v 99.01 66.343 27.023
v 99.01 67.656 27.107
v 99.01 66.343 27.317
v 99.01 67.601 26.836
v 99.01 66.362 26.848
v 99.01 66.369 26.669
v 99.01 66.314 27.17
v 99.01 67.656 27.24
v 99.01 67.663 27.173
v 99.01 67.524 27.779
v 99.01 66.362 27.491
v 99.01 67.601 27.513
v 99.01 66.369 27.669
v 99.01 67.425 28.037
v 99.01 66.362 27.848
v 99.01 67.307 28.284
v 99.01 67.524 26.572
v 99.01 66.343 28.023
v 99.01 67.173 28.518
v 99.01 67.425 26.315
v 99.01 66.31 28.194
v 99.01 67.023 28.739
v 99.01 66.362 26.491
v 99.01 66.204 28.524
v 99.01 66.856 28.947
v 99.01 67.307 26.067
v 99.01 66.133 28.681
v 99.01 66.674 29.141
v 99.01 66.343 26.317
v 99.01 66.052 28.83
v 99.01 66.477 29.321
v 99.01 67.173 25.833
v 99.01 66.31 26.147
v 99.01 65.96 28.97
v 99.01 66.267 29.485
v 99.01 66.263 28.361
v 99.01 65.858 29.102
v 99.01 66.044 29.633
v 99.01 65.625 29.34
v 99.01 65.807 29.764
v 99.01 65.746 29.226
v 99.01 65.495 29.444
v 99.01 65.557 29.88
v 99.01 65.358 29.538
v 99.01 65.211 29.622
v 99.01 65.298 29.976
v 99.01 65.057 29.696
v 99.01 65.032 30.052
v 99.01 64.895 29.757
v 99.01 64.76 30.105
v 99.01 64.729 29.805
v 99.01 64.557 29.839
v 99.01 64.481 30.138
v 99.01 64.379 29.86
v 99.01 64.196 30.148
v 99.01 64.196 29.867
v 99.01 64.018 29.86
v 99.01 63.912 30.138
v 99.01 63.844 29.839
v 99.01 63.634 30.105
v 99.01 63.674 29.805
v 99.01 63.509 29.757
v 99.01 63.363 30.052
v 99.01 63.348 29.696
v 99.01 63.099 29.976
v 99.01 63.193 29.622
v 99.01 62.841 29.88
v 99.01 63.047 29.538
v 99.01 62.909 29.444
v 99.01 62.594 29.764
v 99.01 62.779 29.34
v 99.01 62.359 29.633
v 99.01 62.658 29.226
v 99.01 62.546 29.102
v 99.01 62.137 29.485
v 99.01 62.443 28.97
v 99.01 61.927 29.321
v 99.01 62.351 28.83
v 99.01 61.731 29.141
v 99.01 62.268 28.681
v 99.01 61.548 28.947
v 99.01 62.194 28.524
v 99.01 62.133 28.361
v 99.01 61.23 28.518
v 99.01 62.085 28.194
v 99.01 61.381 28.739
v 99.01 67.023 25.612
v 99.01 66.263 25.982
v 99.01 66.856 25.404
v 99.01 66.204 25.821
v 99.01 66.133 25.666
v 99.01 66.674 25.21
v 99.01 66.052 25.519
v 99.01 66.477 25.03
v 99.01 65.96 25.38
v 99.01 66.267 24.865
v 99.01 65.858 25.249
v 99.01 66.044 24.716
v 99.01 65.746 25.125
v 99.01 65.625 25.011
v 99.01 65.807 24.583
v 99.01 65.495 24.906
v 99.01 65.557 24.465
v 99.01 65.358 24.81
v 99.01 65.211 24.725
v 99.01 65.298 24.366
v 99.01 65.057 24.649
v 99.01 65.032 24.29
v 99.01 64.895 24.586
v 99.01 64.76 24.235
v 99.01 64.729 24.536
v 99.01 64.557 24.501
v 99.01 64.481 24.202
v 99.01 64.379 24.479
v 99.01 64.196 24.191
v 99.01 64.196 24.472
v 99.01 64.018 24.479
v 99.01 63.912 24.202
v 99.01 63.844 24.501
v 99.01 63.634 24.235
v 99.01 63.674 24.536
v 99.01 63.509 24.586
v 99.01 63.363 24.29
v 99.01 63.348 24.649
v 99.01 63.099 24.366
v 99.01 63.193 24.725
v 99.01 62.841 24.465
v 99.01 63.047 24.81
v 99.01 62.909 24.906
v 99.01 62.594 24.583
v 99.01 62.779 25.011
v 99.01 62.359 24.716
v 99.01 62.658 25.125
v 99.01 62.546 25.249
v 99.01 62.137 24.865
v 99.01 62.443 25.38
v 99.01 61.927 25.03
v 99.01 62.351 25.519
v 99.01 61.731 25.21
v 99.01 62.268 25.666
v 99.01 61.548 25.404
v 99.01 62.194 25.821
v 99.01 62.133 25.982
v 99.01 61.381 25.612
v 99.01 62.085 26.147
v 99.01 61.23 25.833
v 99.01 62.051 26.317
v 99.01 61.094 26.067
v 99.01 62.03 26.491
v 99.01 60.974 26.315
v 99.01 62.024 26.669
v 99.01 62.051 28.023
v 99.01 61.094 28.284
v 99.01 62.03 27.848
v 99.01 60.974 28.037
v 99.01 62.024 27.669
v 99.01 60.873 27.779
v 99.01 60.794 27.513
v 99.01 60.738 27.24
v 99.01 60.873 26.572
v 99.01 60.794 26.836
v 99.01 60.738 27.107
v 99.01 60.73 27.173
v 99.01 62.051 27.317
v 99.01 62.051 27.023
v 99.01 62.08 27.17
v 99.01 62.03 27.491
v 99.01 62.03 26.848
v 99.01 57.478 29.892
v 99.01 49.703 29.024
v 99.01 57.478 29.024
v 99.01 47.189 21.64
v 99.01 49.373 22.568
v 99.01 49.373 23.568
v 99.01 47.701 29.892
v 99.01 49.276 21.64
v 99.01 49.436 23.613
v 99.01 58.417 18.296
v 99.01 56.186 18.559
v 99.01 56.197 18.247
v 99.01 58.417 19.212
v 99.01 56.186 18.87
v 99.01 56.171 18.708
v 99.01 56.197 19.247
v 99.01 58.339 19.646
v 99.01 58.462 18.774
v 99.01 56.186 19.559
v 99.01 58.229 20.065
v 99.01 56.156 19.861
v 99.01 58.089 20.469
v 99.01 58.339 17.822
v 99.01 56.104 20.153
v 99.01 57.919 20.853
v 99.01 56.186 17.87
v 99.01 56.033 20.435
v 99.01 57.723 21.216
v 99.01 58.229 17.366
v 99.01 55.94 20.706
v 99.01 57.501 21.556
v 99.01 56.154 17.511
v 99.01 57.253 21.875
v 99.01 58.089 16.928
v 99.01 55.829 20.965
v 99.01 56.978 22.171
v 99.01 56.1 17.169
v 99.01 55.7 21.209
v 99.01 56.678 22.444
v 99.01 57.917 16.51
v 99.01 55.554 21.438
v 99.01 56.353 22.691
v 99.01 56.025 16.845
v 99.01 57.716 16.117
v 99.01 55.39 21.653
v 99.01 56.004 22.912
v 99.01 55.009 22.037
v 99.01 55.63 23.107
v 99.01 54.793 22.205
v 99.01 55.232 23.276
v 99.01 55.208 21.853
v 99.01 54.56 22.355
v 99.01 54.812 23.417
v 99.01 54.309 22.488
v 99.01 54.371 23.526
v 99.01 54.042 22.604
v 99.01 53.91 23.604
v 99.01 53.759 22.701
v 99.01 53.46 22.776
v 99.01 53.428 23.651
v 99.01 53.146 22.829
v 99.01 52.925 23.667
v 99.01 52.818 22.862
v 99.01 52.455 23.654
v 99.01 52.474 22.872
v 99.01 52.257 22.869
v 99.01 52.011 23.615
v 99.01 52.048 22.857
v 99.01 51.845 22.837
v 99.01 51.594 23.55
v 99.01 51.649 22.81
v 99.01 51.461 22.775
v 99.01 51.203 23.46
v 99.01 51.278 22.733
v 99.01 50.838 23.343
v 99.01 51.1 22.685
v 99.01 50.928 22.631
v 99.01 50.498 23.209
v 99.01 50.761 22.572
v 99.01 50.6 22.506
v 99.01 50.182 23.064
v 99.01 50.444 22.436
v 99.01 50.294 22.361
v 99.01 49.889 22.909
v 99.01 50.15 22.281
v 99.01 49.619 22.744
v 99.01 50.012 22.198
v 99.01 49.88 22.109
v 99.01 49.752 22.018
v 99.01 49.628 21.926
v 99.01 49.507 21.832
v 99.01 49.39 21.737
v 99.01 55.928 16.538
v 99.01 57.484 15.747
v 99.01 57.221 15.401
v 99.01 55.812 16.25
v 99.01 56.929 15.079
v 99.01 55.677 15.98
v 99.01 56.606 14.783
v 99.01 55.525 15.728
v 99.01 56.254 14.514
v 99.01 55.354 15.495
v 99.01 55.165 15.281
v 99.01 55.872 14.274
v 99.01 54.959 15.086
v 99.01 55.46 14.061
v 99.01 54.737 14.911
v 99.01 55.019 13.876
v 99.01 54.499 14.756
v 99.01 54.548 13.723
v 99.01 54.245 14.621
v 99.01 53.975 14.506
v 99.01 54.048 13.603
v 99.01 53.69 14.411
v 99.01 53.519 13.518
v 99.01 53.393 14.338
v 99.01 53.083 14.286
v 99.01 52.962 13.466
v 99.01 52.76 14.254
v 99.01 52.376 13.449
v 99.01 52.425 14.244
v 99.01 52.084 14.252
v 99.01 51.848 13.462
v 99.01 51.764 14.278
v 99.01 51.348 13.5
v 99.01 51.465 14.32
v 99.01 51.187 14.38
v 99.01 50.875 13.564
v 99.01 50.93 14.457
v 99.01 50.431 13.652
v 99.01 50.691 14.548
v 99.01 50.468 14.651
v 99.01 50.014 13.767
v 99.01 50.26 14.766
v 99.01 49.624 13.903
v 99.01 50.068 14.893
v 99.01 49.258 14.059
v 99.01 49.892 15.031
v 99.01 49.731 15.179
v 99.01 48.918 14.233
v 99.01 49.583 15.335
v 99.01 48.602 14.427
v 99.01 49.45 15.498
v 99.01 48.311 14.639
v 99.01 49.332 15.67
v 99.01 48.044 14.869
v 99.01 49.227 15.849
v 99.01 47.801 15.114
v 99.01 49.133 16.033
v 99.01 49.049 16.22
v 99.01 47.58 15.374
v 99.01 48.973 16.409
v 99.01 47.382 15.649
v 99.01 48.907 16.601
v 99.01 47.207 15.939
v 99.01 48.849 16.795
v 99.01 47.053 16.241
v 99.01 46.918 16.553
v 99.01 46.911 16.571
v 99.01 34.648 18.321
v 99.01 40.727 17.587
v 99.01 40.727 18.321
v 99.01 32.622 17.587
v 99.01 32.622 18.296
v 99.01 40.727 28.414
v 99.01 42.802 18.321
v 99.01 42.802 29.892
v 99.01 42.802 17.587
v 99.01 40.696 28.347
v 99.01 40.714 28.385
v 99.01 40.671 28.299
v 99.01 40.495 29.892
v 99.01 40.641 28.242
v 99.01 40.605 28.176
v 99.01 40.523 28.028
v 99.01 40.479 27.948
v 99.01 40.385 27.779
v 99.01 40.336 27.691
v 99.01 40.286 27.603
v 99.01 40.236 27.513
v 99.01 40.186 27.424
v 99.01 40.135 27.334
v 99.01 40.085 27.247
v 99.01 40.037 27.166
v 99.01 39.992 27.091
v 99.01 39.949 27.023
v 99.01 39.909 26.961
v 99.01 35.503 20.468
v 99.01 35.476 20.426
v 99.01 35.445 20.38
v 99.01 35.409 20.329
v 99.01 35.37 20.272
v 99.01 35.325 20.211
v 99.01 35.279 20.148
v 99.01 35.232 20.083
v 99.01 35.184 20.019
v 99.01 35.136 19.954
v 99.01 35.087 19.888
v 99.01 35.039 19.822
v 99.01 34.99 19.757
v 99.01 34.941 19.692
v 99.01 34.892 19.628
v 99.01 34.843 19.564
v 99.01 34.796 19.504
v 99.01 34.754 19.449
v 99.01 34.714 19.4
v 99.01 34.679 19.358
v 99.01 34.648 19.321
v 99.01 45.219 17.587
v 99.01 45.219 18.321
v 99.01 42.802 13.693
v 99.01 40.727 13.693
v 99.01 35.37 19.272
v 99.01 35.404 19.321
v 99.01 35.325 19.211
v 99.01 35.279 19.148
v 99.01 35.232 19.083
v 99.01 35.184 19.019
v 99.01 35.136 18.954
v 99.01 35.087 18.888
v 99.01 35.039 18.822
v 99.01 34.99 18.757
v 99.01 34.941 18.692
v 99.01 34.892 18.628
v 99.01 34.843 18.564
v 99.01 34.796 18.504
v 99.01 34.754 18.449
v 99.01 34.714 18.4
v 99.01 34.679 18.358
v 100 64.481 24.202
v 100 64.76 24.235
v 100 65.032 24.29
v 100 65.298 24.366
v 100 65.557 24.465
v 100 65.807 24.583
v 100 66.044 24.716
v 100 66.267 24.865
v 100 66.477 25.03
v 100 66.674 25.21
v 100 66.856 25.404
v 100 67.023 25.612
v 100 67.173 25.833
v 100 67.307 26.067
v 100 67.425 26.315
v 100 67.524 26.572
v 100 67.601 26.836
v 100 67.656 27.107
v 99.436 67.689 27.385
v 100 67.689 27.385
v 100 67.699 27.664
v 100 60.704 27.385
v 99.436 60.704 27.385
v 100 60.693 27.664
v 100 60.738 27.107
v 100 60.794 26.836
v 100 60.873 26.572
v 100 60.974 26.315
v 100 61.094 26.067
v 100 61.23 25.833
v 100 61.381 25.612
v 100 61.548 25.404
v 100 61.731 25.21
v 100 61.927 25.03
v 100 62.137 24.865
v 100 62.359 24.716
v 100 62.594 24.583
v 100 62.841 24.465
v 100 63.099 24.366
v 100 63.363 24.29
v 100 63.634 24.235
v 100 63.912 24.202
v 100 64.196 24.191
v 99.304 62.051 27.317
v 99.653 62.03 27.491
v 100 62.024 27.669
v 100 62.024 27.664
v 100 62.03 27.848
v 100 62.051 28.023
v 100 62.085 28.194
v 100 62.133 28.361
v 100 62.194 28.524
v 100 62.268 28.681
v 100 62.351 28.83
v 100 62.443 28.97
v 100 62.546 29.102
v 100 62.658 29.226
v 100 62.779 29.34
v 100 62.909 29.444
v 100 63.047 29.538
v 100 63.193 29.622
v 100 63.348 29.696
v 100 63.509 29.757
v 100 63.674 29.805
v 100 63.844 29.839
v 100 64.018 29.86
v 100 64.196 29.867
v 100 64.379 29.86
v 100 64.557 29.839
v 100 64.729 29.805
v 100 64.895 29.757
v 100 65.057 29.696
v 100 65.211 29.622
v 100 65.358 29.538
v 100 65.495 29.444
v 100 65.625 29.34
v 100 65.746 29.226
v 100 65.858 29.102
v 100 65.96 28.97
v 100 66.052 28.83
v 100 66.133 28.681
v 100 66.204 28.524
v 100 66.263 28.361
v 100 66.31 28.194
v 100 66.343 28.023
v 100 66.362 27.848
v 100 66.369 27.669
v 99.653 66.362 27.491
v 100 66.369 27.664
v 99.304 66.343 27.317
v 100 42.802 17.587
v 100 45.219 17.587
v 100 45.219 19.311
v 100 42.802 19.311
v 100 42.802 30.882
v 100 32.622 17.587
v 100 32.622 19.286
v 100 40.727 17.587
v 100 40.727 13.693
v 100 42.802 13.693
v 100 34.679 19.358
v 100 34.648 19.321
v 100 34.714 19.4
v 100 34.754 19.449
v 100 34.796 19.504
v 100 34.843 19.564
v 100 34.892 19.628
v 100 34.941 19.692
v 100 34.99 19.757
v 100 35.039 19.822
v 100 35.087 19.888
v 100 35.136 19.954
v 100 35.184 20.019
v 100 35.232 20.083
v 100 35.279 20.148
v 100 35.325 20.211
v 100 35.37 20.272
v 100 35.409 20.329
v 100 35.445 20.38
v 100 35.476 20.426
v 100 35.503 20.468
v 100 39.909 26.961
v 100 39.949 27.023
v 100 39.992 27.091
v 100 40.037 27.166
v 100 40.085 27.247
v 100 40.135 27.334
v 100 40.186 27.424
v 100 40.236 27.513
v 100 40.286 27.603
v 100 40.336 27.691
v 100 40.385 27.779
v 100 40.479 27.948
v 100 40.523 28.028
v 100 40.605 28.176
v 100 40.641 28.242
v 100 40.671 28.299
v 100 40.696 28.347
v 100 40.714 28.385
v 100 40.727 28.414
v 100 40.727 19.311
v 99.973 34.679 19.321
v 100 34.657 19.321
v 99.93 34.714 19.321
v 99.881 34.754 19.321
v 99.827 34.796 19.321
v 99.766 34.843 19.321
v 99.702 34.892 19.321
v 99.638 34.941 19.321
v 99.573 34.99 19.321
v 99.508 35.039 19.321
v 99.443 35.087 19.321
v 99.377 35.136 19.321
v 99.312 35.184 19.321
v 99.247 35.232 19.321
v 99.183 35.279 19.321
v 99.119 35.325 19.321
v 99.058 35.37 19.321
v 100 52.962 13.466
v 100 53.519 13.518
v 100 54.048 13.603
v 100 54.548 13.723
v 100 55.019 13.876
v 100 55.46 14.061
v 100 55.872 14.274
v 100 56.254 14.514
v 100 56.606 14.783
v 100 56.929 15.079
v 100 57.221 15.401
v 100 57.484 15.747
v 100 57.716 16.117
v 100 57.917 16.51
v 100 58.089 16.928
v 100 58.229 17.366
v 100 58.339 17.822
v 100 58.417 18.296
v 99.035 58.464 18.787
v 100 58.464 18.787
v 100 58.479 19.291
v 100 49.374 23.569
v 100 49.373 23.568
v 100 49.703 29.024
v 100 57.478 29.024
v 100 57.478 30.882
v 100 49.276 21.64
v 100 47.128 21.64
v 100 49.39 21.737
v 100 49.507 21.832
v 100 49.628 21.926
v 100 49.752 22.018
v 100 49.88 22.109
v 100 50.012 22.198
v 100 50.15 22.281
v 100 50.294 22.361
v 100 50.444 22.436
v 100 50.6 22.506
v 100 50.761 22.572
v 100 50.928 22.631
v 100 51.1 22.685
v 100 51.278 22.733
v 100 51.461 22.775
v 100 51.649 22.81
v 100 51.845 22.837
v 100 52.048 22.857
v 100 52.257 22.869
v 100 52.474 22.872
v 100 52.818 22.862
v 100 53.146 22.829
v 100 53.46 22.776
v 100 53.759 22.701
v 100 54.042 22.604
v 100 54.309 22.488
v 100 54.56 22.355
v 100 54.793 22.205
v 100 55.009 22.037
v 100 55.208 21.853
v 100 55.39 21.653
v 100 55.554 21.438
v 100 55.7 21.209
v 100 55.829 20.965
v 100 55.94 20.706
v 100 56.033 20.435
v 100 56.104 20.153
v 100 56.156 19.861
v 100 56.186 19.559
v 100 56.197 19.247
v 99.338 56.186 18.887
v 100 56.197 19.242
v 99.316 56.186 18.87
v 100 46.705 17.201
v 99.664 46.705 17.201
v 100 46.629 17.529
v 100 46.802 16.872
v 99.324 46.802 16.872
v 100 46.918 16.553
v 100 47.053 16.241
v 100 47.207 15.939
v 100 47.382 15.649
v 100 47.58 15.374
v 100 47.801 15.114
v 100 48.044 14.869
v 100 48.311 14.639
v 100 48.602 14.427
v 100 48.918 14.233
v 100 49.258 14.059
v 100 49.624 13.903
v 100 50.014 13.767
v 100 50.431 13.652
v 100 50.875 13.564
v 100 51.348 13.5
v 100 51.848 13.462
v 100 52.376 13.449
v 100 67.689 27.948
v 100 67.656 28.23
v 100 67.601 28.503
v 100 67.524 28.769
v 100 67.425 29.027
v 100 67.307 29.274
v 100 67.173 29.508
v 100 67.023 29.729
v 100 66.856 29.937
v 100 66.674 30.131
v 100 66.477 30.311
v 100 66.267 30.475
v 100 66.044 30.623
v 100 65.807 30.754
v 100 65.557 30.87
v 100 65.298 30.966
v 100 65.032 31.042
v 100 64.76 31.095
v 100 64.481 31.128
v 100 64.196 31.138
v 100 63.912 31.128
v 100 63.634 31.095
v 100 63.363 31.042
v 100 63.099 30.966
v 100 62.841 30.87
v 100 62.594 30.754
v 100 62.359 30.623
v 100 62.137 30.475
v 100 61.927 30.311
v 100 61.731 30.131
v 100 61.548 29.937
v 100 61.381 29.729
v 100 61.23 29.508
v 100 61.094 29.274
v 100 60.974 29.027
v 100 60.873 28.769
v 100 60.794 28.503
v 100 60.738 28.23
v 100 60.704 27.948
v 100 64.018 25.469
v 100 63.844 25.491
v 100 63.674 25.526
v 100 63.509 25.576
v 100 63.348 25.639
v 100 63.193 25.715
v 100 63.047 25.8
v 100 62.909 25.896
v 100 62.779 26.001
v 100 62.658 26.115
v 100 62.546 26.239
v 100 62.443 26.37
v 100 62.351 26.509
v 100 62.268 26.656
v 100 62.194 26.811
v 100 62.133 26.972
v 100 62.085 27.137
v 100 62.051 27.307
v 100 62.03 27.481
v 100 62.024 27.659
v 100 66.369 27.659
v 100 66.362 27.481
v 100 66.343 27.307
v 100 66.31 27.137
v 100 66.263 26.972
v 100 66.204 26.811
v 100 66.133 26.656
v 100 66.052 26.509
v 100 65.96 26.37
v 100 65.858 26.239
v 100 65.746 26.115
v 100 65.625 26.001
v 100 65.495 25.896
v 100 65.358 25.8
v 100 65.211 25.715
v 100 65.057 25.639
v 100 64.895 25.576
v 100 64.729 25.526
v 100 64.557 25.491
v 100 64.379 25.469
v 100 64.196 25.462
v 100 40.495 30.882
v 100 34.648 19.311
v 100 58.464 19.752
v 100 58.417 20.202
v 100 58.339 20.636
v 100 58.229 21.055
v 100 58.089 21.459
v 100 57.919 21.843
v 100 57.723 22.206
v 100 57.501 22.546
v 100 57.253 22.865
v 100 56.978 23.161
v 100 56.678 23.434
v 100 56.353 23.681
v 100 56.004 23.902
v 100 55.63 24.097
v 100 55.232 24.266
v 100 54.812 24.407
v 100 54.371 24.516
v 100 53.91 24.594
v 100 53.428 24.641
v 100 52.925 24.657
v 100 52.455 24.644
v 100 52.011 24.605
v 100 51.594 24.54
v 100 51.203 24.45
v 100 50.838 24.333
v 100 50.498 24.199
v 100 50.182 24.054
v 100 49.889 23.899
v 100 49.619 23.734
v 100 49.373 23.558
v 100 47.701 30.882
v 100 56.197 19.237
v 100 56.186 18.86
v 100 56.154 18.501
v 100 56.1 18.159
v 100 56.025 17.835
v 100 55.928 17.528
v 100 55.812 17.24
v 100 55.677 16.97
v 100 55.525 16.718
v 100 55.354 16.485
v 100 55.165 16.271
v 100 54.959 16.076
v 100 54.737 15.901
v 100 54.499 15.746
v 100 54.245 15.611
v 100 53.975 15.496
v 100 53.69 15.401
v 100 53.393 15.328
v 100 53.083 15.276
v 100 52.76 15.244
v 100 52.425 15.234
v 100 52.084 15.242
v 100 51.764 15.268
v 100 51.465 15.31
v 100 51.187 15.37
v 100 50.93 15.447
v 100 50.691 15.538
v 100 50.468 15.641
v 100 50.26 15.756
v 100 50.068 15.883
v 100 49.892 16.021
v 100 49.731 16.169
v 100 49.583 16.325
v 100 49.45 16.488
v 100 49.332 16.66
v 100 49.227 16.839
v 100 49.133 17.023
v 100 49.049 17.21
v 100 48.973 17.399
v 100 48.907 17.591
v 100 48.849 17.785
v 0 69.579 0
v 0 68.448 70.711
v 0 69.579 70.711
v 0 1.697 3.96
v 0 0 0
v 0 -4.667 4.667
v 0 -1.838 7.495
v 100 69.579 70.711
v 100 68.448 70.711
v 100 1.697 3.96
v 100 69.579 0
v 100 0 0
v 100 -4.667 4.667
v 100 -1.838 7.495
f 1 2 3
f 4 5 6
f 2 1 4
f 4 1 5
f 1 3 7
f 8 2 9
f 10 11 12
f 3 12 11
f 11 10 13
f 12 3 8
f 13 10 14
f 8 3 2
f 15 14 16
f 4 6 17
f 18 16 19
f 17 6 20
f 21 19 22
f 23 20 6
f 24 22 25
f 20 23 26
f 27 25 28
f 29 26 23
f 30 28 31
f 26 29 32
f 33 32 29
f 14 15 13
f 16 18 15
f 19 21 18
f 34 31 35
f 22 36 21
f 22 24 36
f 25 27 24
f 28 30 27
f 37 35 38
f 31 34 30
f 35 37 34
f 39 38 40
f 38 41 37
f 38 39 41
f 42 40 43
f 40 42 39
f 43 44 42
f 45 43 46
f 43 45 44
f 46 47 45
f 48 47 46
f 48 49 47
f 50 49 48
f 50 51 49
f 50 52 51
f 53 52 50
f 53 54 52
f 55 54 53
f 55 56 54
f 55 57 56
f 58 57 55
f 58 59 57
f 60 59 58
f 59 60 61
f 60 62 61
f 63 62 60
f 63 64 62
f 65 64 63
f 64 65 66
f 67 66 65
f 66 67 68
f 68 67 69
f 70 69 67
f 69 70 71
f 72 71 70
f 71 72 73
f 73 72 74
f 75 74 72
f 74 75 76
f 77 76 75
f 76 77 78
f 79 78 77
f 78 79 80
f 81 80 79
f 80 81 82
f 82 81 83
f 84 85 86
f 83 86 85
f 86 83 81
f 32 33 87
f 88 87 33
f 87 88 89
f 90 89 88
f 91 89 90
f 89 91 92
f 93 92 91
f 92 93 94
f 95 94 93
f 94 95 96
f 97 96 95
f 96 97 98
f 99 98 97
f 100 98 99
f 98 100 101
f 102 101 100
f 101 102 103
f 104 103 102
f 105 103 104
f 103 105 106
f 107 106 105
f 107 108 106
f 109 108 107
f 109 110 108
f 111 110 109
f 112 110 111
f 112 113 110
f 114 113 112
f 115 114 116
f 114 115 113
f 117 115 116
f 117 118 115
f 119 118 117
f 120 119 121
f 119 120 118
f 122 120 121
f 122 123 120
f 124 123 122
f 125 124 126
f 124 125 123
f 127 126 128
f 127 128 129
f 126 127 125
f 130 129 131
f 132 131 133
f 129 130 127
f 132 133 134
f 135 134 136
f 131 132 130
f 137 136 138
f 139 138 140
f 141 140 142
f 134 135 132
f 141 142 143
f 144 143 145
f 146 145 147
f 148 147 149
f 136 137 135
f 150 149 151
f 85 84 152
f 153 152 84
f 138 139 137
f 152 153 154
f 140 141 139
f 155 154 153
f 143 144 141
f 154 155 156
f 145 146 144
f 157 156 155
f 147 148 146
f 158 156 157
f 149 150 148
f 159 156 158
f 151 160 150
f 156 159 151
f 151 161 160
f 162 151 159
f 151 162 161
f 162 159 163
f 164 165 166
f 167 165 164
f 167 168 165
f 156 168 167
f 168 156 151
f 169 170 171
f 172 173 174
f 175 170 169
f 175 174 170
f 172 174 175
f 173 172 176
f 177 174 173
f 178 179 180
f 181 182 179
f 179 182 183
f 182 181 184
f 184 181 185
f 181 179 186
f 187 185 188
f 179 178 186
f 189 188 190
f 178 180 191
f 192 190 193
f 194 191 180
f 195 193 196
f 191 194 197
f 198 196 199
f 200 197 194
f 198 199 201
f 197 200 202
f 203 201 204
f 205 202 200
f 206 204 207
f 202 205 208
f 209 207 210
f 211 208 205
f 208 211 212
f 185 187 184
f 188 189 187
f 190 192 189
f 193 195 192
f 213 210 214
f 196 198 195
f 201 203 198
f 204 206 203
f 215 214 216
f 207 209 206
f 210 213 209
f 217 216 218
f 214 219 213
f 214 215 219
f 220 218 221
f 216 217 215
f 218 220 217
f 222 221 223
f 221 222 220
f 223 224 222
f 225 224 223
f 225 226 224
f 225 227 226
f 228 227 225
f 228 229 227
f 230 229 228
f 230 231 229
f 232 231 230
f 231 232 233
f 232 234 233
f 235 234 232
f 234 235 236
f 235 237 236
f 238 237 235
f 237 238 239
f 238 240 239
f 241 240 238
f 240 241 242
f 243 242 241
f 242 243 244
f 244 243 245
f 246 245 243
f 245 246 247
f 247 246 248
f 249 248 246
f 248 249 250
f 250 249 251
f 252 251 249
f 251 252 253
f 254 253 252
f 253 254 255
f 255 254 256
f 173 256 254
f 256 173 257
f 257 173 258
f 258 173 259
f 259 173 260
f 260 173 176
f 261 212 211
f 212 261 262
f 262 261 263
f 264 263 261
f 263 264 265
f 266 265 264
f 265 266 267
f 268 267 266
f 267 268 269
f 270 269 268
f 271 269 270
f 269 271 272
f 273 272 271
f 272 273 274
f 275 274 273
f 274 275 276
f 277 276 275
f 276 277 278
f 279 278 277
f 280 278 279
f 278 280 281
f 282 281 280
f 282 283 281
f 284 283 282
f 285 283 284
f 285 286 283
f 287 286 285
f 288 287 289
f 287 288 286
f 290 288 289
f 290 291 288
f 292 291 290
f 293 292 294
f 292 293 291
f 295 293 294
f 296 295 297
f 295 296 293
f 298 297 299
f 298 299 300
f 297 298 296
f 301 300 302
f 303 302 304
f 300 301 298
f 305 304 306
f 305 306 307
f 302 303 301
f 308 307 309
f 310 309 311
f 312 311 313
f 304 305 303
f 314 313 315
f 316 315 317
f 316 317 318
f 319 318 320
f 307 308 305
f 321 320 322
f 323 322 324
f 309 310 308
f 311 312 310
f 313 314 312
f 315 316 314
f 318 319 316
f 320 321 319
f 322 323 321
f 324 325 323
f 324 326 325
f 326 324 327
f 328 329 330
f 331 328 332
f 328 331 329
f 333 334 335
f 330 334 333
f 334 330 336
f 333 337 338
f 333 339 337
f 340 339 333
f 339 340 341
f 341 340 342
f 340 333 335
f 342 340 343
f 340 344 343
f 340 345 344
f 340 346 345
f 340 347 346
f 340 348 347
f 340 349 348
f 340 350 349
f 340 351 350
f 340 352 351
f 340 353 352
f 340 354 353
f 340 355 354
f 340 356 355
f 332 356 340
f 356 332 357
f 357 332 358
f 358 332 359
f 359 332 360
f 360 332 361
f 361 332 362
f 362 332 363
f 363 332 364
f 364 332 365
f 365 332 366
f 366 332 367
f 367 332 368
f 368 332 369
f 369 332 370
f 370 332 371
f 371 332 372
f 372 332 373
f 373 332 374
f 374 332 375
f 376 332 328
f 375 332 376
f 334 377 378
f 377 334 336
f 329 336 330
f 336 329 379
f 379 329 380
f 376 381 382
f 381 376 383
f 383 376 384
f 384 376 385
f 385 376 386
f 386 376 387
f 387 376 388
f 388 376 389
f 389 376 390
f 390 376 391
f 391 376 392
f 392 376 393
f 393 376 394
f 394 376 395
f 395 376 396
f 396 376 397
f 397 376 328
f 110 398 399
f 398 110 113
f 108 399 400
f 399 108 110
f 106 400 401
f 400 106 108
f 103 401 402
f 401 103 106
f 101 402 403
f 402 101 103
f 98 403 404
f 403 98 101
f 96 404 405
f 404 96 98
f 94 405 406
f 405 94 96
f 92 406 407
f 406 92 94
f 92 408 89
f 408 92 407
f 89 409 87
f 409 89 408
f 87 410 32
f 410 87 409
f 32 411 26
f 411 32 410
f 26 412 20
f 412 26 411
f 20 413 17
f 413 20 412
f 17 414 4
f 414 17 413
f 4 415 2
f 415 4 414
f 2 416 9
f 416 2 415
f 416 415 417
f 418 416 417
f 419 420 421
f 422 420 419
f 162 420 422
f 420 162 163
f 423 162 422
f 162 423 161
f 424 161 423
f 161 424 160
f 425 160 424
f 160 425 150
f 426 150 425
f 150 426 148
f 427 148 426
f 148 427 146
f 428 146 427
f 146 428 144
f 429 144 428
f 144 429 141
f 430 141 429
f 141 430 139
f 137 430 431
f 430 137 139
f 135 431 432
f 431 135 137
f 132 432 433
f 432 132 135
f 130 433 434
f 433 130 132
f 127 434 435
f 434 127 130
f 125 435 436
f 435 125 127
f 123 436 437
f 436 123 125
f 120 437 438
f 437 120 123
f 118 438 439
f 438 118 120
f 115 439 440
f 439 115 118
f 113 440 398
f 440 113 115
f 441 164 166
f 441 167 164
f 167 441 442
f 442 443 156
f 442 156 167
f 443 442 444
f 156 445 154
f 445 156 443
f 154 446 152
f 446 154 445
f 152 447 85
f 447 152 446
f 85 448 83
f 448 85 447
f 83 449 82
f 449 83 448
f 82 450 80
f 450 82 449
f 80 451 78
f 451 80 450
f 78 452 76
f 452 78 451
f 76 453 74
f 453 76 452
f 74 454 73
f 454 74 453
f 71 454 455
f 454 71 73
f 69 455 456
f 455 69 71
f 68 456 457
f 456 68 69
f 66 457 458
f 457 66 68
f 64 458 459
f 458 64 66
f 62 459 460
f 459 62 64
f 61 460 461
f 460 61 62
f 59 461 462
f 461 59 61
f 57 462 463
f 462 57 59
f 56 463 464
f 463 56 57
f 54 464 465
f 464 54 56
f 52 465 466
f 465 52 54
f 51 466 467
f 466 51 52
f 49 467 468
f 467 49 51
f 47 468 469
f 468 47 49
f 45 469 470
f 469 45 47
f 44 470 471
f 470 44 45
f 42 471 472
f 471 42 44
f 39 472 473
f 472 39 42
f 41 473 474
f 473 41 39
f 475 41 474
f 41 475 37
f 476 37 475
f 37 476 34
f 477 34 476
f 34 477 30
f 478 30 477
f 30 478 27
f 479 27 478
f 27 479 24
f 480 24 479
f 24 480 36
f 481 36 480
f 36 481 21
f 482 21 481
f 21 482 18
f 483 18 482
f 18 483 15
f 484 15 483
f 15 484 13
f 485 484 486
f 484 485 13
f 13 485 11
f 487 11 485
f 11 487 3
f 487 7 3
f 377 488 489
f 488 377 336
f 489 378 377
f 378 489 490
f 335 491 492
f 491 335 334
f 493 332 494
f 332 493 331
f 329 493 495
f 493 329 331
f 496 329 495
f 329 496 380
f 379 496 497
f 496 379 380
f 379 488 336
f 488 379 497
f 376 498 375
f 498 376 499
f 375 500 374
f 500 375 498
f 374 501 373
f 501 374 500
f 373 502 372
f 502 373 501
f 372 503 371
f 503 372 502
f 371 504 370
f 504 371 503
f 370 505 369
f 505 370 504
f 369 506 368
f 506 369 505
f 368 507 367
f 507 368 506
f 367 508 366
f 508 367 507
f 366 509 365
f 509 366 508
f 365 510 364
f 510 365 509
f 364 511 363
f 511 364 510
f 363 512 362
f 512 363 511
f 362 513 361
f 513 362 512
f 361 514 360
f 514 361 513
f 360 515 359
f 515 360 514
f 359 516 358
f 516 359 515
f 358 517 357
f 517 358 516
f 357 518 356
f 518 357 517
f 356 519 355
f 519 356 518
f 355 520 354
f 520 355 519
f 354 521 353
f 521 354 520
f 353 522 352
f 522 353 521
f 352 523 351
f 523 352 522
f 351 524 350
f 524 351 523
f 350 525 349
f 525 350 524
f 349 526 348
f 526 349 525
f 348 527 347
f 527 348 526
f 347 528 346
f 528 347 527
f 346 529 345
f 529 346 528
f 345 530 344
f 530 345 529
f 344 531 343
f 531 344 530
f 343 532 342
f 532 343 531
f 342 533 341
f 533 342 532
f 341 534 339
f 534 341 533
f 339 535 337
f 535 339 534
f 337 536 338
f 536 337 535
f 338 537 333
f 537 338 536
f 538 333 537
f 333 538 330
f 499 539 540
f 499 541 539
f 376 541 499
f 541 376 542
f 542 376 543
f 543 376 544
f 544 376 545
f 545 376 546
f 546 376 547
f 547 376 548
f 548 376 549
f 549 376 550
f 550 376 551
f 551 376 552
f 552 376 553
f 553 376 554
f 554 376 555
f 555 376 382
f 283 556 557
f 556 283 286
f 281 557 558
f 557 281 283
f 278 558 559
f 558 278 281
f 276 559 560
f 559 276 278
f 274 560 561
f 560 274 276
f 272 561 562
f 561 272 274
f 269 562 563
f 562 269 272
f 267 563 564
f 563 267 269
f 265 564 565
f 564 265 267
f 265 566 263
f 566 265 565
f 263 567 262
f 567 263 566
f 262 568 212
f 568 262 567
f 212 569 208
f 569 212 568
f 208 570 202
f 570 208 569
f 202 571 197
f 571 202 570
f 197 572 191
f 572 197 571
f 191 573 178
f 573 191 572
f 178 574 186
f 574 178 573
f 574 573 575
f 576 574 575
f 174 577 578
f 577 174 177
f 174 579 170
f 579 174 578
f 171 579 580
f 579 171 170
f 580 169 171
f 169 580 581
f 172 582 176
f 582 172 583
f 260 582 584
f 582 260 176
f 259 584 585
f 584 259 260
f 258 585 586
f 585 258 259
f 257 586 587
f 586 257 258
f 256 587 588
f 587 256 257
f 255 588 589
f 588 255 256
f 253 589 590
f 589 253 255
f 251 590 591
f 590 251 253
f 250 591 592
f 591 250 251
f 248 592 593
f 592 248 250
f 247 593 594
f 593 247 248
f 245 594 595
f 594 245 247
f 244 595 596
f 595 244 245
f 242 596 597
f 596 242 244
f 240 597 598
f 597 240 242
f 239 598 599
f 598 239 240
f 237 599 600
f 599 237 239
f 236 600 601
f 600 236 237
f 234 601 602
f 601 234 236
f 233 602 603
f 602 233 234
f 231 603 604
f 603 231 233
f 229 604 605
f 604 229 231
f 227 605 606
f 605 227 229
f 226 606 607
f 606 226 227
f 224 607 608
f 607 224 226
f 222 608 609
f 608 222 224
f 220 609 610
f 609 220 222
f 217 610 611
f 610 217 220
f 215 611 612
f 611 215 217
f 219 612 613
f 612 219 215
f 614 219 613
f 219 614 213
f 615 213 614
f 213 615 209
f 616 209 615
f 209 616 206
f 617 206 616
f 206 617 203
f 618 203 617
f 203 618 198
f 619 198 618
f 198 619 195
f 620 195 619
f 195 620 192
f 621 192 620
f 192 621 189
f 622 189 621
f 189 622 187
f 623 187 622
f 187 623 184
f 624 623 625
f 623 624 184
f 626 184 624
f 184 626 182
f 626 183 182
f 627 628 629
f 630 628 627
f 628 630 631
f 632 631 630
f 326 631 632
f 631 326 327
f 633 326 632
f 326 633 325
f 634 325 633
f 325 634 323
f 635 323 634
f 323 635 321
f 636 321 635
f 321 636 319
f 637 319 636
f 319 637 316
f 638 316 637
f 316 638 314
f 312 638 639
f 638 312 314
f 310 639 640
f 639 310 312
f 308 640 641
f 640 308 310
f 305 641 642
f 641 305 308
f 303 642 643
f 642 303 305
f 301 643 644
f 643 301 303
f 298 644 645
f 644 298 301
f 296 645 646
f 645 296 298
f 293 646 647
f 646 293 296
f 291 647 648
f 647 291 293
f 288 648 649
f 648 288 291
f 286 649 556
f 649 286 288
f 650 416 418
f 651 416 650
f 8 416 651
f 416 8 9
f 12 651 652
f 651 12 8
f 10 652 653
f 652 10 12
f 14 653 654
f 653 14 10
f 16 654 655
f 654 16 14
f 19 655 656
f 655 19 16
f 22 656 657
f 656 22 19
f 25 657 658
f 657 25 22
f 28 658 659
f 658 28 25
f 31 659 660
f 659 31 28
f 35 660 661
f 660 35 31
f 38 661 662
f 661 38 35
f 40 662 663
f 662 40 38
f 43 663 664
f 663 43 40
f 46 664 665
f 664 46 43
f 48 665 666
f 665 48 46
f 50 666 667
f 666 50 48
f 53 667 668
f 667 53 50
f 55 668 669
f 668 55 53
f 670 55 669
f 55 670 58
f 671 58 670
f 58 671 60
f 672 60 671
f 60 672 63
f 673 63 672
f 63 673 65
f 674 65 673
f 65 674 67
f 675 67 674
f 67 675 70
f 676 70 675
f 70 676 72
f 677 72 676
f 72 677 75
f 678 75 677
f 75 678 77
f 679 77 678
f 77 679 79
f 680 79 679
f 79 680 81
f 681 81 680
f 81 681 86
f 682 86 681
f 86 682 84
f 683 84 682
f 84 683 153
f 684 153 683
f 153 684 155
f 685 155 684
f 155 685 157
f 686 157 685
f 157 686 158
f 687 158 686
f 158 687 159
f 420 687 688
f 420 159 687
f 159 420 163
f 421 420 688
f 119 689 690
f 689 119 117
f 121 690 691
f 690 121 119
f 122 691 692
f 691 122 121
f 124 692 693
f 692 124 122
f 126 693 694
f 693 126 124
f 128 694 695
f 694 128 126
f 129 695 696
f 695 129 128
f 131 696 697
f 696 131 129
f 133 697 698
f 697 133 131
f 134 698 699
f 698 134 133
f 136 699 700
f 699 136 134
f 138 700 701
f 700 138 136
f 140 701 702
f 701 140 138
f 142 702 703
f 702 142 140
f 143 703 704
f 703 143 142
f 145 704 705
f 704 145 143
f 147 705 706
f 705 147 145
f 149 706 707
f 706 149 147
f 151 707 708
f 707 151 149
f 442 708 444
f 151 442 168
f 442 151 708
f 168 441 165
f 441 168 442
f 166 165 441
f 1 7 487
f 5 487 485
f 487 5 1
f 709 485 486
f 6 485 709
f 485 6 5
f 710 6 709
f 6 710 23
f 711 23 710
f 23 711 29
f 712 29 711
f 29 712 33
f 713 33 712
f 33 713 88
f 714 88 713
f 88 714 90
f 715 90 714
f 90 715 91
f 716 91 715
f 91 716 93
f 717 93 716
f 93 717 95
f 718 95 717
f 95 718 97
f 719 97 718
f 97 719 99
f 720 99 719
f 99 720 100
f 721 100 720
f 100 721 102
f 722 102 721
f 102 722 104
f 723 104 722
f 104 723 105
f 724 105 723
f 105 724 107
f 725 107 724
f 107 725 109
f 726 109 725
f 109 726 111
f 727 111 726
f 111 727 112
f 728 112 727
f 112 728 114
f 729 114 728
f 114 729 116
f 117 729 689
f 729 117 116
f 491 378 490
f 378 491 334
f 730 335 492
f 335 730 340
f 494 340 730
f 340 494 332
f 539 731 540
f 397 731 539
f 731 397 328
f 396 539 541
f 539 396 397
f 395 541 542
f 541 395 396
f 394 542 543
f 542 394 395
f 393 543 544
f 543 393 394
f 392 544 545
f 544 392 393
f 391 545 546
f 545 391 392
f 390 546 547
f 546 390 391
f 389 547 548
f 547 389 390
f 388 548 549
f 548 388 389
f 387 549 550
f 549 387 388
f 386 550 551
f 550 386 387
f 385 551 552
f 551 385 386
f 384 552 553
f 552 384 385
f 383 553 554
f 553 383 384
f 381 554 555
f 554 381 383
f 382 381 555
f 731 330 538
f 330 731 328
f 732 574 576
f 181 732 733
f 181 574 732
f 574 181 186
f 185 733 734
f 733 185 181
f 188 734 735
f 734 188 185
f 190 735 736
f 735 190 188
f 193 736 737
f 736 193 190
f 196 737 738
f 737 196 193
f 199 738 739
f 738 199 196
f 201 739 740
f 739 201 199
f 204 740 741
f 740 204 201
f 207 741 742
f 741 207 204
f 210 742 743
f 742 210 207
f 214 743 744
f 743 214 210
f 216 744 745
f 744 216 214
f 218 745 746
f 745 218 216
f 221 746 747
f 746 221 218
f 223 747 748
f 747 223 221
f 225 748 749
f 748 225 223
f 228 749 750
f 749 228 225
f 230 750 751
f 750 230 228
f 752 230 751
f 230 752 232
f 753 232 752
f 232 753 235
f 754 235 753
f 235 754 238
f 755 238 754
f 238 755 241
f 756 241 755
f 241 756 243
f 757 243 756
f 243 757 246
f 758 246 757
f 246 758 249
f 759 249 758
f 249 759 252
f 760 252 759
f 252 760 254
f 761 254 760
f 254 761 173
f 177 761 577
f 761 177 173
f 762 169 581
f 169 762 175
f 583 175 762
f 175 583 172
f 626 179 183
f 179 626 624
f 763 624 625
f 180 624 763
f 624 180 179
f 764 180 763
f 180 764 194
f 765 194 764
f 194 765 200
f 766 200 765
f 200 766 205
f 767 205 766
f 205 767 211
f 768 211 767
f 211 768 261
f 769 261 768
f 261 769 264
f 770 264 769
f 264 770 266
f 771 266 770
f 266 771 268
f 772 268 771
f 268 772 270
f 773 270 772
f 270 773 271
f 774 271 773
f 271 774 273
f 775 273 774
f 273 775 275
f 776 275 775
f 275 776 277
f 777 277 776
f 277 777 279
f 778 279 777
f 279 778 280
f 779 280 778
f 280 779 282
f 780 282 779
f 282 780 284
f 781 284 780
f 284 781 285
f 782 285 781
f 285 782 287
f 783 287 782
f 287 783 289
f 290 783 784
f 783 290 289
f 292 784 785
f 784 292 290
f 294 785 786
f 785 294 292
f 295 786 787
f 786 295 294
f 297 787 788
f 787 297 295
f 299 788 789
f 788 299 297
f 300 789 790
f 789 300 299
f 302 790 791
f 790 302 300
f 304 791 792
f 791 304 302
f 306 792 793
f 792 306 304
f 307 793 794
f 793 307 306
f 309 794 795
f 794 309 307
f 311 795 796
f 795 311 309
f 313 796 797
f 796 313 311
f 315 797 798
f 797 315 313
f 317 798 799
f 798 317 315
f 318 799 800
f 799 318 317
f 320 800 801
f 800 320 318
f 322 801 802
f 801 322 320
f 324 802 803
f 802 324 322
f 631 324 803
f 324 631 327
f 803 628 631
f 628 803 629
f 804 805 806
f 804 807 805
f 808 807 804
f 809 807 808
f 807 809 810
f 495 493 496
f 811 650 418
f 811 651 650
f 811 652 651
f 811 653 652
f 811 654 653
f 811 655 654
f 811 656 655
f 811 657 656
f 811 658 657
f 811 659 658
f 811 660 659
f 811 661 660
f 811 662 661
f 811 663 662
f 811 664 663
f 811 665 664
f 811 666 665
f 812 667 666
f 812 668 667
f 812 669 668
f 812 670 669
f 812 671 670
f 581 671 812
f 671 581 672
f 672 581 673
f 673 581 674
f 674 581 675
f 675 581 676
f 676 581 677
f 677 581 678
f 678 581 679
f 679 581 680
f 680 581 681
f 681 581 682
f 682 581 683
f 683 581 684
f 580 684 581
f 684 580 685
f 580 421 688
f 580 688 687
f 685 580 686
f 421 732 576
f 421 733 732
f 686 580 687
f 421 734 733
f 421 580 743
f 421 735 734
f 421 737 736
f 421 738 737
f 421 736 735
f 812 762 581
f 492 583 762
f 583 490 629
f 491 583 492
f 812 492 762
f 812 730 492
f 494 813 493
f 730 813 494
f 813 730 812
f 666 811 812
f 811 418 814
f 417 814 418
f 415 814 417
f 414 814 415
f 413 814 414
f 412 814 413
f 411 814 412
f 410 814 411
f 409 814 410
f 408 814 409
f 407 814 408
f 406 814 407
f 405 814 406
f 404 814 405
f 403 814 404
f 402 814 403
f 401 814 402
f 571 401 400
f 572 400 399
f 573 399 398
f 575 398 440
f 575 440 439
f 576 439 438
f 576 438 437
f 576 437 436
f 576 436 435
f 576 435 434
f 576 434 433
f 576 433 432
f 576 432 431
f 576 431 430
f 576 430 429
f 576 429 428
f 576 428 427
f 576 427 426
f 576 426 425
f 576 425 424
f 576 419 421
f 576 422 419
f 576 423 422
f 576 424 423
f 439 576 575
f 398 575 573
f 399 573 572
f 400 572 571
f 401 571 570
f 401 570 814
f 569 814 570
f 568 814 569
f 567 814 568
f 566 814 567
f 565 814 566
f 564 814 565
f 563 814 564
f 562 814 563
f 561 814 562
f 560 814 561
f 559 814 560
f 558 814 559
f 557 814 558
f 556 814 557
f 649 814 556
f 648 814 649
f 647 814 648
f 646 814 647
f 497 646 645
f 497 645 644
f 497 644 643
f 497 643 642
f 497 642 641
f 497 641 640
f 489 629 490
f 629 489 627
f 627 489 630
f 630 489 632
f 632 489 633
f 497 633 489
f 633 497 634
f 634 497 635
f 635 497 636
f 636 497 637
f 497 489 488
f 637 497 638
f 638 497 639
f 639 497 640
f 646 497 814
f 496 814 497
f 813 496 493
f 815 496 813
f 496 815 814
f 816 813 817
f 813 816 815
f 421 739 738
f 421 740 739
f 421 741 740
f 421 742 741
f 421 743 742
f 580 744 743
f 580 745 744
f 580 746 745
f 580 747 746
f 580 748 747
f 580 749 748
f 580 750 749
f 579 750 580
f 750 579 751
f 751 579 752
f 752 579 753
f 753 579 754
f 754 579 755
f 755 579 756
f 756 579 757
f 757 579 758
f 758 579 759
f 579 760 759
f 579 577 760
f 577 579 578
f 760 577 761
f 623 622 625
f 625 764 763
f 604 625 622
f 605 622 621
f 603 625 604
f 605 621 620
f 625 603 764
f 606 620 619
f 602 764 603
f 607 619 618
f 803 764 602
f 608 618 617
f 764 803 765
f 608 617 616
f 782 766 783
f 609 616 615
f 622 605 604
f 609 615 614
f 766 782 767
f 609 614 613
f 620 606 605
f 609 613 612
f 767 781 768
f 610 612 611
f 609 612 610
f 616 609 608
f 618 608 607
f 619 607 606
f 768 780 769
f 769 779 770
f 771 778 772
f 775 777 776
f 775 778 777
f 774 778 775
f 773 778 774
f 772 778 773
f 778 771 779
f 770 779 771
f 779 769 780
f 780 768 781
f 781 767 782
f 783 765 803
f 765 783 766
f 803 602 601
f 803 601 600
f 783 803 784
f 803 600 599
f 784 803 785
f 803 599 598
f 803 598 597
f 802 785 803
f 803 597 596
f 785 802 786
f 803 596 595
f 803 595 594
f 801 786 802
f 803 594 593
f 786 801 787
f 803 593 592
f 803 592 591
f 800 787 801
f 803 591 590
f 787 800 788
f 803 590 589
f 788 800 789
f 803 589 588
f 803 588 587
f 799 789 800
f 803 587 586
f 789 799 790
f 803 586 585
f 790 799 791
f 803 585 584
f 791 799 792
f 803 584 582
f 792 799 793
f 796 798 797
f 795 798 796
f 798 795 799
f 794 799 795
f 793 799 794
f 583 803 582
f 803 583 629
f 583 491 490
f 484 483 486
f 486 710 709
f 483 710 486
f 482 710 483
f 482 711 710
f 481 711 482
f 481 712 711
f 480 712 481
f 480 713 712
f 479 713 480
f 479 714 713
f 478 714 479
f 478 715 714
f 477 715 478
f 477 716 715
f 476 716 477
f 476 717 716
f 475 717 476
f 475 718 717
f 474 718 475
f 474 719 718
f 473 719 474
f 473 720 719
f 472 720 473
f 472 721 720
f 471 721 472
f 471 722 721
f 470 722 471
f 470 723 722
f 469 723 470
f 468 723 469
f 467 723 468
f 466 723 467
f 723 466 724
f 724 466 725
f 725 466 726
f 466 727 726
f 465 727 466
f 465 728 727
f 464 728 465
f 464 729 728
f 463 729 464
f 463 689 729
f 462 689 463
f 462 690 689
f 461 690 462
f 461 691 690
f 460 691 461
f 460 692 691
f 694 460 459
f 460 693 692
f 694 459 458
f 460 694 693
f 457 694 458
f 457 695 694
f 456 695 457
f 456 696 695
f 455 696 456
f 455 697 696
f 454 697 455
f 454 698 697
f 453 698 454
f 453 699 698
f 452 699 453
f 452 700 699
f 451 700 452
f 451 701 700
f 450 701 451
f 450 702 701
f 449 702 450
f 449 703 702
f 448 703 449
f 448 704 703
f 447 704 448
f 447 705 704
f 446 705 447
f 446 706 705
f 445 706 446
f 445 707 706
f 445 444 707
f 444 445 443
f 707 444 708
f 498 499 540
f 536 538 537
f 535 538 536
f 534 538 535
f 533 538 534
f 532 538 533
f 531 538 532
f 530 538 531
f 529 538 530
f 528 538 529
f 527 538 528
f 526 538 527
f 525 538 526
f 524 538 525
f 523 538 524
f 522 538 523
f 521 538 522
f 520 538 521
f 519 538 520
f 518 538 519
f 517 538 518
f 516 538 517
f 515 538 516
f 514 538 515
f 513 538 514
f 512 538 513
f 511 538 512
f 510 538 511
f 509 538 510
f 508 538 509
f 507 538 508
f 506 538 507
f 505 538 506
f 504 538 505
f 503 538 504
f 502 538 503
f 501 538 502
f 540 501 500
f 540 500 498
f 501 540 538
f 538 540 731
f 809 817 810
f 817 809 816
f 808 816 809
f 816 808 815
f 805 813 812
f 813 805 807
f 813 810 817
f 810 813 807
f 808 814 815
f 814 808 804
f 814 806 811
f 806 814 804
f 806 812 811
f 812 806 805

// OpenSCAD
// Angle of the plate holding the solar cell
angle=45; // [0:0.1:90]
// Height
height=100;
// Width
width=100;
// Thickness
thick = 1.6;
// ??
text_depth=1;

$fa = 10;
$fs = 0.2;

module for_vertical_print_internal() {
  M = [ [   1,   0,   0,   0 ],
        [   0,   1,   0,   0 ],
        [   0,   1,   1,   0 ],
        [   0,   0,   0,   1 ]];
  intersection() {
    children();
    translate([0, 0, -1])
      multmatrix(M)
        children();
  }
}

module text_for_3dprint(t, size_rel=1) {
  for_vertical_print_internal() {
    rotate([90, 0, 180])
      linear_extrude(height=text_depth, convexity=10)
        text(t, halign="center", valign="center", size=10/50*height*size_rel);
  }
}

module holder() {
  size_determinant = (angle > 45 ? pow(cos(angle), 2.5) : sin(angle));
  size_rel = sqrt(sqrt(2)*size_determinant);
  difference() {
    rotate([angle, 0, 0]) {
      translate([0, 0, -100])
        cube([width, height, 6.6+100], center=false);
    }
    rotate([angle, 0, 0]) {
      translate([-.5, 4, thick])
        cube([width+1, height+1, 6.6], center=false);
    }
    translate([0, 0, -5*height])
      cube([5*width, 5*height, 10*height], center=true);
    translate([-1, height*cos(angle)-thick*sin(angle), -1]) {
      cube([5*width, 5*height, 5*height], center=false);
    }
    translate([-1, 0, height*sin(angle)])
      cube([500, 500, 50]);
    translate([width-text_depth+0.01, height*cos(angle)/1.4, height*sin(angle)/3.2])
      rotate([0, 0, -90])
        text_for_3dprint(str(angle, "°"), size_rel=0.9*size_rel);
  }
}

holder();
